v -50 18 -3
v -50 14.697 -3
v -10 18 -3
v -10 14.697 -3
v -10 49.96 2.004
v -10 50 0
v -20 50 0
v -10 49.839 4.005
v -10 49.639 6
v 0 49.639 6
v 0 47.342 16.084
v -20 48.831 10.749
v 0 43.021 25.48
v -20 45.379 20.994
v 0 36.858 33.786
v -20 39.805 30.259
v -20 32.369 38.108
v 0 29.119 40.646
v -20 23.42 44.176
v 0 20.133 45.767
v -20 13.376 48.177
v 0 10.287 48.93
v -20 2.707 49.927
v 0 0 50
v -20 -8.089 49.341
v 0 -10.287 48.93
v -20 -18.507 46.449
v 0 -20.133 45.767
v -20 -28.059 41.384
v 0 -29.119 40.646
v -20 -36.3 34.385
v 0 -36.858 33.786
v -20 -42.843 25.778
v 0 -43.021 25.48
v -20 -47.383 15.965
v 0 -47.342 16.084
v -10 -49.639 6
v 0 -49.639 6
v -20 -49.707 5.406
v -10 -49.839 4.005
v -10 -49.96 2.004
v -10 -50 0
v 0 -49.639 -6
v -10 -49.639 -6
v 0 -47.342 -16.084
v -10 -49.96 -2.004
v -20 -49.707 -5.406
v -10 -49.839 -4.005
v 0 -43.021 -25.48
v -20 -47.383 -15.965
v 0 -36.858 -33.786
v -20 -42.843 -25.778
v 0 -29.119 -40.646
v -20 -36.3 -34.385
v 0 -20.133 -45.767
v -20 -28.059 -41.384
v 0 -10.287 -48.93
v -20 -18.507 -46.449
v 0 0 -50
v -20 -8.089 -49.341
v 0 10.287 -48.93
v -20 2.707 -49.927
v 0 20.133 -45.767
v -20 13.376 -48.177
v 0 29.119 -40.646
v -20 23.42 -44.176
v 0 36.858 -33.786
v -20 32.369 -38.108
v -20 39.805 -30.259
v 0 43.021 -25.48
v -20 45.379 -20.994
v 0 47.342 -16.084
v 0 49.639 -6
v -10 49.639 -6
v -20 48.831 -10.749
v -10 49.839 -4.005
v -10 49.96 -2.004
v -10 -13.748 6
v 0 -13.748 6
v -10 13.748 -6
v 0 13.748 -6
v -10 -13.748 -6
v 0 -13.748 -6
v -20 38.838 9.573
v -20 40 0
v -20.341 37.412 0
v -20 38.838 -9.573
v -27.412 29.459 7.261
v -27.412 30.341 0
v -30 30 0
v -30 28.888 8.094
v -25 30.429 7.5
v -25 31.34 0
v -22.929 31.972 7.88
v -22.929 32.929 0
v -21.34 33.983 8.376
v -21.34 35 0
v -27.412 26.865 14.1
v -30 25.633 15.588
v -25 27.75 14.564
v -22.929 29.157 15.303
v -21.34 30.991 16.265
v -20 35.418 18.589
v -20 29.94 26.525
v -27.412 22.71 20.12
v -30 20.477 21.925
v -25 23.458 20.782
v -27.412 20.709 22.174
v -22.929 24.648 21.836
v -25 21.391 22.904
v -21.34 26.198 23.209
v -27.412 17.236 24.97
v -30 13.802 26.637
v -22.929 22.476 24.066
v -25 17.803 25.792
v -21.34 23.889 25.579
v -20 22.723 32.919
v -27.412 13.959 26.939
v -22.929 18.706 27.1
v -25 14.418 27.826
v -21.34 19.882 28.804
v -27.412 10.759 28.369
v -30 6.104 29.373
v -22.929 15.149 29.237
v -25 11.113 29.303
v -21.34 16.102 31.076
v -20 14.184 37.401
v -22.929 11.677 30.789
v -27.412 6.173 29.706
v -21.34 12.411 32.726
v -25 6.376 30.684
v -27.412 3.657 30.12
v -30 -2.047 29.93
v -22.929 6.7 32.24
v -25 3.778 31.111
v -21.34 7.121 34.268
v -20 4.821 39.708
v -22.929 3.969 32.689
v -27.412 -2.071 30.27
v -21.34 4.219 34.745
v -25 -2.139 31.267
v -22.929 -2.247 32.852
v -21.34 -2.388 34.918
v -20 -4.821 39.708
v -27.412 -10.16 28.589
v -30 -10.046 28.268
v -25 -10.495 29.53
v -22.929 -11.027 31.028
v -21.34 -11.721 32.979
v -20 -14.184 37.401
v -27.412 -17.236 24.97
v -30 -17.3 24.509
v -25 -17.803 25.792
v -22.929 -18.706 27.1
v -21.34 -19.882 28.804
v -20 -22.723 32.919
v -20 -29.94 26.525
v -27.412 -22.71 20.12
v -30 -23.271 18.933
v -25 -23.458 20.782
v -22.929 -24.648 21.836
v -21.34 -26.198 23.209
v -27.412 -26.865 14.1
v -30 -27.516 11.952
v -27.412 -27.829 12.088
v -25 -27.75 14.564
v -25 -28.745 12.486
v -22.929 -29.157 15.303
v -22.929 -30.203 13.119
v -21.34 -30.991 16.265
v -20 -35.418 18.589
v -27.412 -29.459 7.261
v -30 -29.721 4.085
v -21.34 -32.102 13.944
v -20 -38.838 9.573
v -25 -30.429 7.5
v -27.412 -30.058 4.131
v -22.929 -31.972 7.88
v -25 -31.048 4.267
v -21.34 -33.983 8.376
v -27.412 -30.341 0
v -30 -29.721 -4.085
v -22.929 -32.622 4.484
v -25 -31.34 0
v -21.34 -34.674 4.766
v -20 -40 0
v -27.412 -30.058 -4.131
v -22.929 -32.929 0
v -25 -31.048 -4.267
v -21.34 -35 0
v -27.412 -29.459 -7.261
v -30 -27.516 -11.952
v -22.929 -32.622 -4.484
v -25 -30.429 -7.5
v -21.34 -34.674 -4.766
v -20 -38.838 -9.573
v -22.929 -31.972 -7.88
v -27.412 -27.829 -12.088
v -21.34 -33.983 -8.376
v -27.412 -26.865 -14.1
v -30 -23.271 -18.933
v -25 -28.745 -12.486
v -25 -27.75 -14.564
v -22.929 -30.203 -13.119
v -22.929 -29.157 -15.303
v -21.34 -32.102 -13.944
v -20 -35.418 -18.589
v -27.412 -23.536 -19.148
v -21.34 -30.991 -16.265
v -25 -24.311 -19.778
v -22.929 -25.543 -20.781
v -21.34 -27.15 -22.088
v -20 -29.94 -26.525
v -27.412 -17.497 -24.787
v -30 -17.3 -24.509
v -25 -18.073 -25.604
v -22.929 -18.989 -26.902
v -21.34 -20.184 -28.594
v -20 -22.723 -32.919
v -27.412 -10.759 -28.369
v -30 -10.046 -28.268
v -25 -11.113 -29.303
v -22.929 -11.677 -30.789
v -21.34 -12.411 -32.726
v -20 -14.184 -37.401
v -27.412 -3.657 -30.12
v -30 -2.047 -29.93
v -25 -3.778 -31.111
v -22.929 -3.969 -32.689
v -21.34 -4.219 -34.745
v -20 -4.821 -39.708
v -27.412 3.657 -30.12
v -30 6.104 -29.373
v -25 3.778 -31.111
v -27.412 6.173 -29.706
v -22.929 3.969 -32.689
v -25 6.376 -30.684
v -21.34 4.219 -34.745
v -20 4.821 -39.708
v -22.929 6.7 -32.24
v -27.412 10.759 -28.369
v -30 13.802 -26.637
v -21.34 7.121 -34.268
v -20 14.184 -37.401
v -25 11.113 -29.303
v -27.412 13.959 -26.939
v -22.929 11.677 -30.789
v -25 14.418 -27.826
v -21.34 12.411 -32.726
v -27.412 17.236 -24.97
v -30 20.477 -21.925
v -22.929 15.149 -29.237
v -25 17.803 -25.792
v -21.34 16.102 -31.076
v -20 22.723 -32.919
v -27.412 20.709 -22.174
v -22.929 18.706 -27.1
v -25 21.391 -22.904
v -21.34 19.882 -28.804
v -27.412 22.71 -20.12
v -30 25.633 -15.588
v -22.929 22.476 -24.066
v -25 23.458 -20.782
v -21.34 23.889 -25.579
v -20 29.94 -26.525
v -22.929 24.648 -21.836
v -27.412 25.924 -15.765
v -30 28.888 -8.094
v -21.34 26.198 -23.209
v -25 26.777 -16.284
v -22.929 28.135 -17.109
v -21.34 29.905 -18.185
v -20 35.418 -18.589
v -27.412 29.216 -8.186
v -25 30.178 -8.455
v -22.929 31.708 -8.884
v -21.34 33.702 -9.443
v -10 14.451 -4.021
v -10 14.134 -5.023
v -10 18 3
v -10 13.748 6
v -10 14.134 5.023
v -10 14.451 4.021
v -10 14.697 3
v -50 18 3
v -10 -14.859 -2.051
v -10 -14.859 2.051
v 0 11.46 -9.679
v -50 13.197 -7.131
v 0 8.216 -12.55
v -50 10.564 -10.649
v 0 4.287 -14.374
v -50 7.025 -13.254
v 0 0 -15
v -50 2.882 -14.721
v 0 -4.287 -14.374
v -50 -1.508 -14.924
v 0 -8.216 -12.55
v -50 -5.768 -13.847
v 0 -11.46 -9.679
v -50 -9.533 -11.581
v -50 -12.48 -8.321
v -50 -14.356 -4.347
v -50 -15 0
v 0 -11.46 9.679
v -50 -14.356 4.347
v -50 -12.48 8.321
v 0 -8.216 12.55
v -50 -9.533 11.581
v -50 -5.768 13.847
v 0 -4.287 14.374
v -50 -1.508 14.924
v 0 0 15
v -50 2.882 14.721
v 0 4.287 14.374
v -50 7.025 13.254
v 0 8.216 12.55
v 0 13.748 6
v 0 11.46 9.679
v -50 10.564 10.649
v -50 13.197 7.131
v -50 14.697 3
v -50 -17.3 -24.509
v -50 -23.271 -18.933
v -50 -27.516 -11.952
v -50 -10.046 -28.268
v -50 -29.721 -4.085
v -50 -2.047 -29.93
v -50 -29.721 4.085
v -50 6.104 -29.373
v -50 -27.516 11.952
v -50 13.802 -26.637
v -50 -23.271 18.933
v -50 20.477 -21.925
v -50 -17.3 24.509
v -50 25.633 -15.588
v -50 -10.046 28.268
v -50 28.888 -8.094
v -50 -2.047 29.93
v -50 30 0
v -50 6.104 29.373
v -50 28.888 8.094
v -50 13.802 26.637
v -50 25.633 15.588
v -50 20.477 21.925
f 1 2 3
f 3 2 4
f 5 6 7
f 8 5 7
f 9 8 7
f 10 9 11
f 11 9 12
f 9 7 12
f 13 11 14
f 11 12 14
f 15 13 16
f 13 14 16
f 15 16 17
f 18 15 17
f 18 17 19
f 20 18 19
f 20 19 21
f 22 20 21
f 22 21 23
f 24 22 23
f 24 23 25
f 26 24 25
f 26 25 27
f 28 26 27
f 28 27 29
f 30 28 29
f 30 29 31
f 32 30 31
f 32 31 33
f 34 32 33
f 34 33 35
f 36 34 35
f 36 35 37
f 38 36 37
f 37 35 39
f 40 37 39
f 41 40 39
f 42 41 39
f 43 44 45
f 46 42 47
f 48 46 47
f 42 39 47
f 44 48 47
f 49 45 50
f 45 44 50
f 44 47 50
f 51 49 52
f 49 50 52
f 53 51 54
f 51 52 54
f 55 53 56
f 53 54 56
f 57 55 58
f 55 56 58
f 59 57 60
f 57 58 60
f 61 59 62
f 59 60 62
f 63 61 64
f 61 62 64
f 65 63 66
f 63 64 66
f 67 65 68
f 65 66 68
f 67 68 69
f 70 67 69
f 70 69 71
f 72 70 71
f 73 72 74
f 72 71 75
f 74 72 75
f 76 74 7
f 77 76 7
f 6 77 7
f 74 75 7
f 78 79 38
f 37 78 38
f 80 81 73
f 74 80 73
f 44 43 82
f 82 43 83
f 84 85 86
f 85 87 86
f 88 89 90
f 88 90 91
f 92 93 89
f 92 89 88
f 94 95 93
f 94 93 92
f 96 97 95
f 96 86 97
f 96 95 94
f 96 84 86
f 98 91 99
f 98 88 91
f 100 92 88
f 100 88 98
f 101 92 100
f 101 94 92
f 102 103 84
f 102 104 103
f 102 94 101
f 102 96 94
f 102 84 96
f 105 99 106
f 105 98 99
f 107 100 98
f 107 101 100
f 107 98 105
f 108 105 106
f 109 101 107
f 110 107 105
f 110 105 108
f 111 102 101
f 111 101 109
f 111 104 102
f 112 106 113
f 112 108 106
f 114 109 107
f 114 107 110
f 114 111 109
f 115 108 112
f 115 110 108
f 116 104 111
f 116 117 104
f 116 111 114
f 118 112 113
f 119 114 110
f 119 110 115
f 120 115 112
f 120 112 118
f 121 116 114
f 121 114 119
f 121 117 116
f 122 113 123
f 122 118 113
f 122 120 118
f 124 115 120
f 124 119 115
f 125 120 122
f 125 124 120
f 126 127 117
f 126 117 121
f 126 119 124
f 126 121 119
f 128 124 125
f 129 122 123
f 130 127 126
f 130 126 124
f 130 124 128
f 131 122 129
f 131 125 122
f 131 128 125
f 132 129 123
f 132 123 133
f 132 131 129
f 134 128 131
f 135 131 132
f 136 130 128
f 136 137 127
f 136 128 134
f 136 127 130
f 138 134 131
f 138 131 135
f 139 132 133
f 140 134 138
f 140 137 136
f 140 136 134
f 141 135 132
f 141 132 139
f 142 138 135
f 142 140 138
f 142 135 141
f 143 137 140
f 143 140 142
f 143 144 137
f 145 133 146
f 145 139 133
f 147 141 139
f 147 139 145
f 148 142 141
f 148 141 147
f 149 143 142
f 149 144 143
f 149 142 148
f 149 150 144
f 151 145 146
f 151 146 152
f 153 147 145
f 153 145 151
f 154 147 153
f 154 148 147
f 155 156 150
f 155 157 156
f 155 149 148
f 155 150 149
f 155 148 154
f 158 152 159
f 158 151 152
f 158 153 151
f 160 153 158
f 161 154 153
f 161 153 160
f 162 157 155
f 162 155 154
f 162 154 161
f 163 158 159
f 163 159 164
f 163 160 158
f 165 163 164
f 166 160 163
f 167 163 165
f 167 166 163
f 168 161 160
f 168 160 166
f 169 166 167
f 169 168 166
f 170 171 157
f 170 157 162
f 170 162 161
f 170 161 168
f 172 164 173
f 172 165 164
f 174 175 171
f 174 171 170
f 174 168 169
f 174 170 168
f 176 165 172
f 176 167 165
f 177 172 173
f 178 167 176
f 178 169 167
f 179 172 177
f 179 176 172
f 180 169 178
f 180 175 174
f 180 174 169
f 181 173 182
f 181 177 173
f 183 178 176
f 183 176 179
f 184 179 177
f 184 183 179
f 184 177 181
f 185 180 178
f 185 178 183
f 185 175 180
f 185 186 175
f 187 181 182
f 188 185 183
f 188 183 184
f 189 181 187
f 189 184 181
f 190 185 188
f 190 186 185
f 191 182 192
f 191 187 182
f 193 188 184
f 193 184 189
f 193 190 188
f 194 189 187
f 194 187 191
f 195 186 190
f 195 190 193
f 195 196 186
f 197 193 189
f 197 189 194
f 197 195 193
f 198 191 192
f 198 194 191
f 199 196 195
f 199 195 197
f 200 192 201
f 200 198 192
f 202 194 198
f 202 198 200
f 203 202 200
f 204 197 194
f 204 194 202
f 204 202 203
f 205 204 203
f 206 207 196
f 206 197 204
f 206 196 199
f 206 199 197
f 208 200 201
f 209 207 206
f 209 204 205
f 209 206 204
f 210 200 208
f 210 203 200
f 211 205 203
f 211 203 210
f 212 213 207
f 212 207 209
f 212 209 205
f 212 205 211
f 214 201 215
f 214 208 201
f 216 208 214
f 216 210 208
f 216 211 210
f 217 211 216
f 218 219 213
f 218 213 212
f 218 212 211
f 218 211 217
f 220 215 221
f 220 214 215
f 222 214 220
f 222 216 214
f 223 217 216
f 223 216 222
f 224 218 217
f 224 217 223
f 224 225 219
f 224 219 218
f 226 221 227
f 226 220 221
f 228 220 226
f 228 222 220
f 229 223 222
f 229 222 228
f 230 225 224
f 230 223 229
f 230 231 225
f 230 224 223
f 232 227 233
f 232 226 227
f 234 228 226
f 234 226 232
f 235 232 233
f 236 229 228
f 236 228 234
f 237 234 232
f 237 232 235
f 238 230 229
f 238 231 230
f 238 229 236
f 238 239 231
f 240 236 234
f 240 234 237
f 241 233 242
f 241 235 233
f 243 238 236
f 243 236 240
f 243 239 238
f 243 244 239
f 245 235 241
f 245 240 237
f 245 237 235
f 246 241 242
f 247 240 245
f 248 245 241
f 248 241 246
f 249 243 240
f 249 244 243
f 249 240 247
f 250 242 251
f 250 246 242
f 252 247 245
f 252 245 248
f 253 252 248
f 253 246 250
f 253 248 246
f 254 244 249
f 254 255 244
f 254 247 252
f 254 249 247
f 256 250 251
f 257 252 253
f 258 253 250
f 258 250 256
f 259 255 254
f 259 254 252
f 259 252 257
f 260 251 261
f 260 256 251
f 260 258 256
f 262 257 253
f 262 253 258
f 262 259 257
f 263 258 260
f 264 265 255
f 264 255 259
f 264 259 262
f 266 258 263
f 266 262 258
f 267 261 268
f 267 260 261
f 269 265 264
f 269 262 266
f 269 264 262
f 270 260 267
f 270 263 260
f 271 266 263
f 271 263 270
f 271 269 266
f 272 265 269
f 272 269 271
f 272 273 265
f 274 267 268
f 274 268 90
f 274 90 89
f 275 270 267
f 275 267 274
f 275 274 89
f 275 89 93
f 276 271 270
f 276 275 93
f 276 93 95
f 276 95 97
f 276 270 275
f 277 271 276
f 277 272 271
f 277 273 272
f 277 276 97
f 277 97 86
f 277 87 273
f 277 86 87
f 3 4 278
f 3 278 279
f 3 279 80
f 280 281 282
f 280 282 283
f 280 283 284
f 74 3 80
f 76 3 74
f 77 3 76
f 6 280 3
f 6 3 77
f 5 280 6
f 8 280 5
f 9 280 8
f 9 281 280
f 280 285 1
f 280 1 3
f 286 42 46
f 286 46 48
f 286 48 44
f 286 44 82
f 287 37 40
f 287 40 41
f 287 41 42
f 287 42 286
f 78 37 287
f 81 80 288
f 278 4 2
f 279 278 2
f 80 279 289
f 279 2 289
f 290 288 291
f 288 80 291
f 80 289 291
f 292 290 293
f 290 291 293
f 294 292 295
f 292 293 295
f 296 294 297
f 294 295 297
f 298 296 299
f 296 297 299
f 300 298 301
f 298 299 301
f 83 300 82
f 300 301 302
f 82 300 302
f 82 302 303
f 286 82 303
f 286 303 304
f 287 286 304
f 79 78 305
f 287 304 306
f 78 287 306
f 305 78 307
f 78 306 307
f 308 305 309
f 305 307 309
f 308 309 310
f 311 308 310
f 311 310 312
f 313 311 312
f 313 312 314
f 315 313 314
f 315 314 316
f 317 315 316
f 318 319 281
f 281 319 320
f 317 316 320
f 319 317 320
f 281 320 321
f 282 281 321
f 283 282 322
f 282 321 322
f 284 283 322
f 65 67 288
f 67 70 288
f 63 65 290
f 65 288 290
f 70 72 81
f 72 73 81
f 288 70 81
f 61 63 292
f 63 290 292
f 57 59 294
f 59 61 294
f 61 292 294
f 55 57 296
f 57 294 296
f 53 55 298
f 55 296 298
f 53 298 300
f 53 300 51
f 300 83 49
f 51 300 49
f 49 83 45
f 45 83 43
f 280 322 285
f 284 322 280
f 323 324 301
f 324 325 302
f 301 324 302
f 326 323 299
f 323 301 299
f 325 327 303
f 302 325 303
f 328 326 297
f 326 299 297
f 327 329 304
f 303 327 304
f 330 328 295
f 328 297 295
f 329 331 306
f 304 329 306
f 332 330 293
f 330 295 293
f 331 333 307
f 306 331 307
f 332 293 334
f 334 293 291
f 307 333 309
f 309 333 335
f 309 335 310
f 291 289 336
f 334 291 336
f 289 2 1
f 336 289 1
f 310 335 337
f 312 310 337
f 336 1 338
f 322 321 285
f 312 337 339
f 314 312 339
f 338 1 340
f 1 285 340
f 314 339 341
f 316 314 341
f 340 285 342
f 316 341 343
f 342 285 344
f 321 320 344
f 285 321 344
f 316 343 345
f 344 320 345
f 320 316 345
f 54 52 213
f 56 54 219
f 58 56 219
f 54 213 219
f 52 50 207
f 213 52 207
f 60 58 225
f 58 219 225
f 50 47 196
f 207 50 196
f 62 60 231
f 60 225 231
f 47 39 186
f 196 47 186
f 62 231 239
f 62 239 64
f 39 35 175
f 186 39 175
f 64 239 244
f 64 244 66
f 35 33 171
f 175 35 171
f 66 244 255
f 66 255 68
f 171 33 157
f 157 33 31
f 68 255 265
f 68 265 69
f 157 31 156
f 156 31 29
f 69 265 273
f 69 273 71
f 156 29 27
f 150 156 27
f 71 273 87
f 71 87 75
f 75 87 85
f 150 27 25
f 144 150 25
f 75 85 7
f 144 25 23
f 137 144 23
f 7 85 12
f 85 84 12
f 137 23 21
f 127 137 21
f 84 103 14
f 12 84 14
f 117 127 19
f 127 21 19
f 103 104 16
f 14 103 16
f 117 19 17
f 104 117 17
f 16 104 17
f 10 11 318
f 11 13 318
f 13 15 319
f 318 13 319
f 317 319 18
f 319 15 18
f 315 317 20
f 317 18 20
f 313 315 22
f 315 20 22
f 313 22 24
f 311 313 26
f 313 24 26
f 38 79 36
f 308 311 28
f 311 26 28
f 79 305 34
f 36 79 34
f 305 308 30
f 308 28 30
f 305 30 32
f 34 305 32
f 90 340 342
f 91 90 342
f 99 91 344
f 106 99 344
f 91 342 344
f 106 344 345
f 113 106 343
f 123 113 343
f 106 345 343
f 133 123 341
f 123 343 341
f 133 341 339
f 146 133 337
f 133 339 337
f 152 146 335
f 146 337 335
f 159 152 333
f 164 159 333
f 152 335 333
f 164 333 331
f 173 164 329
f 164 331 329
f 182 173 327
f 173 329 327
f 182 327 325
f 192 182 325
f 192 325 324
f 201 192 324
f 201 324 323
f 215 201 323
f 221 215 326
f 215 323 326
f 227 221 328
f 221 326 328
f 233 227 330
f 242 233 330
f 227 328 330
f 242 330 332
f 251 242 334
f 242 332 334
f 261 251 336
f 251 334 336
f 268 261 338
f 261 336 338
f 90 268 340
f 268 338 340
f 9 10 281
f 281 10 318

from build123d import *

# Parameters (mm, degrees)
F3_DEPTH = 10
F4_R     = 15
F5_DEPTH = 52.4
F6_W     = 100
F6_H     = 6
F7_DEPTH = 18
F8_R     = 10


with BuildPart() as f1:
    # F0 (on Top) → F1 (revolve)
    with BuildSketch(Plane.XY):
        Polygon((-50, 0), (0, 0), (0, 50), (-20, 50), (-20, 30), (-50, 30), align=None)
    revolve(axis=Axis((-25, 0, 0), (1, 0, 0)))

    # F2 (on face) → F3 (cut)
    with BuildSketch(Plane.YZ):
        with BuildLine():
            Line((49.638695, 6), (-49.638695, 6))
            ThreePointArc((-49.638695, 6), (-49.909592, 3.005434), (-50, 0))
            ThreePointArc((-50, 0), (-49.909592, -3.005434), (-49.638695, -6))
            Line((-49.638695, -6), (49.638695, -6))
            ThreePointArc((49.638695, -6), (49.909592, -3.005434), (50, 0))
            ThreePointArc((50, 0), (49.909592, 3.005434), (49.638695, 6))
        make_face()
    extrude(amount=-F3_DEPTH, mode=Mode.SUBTRACT)

    # F4 (on face) → F5 (cut)
    with BuildSketch(Plane(origin=(-50, 0, 0), x_dir=(0, -1, 0), z_dir=(-1, 0, 0))):
        Circle(F4_R)
    extrude(amount=-F5_DEPTH, mode=Mode.SUBTRACT)

    # F6 (on Front) → F7 (cut)
    with BuildSketch(Plane.XZ):
        Rectangle(F6_W, F6_H)
    extrude(amount=-F7_DEPTH, mode=Mode.SUBTRACT)

    # F8
    f8_edges = [f1.edges().sort_by_distance(p)[0] for p in [
        (-20, -30, 0),
    ]]
    fillet(f8_edges, radius=F8_R)


solid = f1.part
